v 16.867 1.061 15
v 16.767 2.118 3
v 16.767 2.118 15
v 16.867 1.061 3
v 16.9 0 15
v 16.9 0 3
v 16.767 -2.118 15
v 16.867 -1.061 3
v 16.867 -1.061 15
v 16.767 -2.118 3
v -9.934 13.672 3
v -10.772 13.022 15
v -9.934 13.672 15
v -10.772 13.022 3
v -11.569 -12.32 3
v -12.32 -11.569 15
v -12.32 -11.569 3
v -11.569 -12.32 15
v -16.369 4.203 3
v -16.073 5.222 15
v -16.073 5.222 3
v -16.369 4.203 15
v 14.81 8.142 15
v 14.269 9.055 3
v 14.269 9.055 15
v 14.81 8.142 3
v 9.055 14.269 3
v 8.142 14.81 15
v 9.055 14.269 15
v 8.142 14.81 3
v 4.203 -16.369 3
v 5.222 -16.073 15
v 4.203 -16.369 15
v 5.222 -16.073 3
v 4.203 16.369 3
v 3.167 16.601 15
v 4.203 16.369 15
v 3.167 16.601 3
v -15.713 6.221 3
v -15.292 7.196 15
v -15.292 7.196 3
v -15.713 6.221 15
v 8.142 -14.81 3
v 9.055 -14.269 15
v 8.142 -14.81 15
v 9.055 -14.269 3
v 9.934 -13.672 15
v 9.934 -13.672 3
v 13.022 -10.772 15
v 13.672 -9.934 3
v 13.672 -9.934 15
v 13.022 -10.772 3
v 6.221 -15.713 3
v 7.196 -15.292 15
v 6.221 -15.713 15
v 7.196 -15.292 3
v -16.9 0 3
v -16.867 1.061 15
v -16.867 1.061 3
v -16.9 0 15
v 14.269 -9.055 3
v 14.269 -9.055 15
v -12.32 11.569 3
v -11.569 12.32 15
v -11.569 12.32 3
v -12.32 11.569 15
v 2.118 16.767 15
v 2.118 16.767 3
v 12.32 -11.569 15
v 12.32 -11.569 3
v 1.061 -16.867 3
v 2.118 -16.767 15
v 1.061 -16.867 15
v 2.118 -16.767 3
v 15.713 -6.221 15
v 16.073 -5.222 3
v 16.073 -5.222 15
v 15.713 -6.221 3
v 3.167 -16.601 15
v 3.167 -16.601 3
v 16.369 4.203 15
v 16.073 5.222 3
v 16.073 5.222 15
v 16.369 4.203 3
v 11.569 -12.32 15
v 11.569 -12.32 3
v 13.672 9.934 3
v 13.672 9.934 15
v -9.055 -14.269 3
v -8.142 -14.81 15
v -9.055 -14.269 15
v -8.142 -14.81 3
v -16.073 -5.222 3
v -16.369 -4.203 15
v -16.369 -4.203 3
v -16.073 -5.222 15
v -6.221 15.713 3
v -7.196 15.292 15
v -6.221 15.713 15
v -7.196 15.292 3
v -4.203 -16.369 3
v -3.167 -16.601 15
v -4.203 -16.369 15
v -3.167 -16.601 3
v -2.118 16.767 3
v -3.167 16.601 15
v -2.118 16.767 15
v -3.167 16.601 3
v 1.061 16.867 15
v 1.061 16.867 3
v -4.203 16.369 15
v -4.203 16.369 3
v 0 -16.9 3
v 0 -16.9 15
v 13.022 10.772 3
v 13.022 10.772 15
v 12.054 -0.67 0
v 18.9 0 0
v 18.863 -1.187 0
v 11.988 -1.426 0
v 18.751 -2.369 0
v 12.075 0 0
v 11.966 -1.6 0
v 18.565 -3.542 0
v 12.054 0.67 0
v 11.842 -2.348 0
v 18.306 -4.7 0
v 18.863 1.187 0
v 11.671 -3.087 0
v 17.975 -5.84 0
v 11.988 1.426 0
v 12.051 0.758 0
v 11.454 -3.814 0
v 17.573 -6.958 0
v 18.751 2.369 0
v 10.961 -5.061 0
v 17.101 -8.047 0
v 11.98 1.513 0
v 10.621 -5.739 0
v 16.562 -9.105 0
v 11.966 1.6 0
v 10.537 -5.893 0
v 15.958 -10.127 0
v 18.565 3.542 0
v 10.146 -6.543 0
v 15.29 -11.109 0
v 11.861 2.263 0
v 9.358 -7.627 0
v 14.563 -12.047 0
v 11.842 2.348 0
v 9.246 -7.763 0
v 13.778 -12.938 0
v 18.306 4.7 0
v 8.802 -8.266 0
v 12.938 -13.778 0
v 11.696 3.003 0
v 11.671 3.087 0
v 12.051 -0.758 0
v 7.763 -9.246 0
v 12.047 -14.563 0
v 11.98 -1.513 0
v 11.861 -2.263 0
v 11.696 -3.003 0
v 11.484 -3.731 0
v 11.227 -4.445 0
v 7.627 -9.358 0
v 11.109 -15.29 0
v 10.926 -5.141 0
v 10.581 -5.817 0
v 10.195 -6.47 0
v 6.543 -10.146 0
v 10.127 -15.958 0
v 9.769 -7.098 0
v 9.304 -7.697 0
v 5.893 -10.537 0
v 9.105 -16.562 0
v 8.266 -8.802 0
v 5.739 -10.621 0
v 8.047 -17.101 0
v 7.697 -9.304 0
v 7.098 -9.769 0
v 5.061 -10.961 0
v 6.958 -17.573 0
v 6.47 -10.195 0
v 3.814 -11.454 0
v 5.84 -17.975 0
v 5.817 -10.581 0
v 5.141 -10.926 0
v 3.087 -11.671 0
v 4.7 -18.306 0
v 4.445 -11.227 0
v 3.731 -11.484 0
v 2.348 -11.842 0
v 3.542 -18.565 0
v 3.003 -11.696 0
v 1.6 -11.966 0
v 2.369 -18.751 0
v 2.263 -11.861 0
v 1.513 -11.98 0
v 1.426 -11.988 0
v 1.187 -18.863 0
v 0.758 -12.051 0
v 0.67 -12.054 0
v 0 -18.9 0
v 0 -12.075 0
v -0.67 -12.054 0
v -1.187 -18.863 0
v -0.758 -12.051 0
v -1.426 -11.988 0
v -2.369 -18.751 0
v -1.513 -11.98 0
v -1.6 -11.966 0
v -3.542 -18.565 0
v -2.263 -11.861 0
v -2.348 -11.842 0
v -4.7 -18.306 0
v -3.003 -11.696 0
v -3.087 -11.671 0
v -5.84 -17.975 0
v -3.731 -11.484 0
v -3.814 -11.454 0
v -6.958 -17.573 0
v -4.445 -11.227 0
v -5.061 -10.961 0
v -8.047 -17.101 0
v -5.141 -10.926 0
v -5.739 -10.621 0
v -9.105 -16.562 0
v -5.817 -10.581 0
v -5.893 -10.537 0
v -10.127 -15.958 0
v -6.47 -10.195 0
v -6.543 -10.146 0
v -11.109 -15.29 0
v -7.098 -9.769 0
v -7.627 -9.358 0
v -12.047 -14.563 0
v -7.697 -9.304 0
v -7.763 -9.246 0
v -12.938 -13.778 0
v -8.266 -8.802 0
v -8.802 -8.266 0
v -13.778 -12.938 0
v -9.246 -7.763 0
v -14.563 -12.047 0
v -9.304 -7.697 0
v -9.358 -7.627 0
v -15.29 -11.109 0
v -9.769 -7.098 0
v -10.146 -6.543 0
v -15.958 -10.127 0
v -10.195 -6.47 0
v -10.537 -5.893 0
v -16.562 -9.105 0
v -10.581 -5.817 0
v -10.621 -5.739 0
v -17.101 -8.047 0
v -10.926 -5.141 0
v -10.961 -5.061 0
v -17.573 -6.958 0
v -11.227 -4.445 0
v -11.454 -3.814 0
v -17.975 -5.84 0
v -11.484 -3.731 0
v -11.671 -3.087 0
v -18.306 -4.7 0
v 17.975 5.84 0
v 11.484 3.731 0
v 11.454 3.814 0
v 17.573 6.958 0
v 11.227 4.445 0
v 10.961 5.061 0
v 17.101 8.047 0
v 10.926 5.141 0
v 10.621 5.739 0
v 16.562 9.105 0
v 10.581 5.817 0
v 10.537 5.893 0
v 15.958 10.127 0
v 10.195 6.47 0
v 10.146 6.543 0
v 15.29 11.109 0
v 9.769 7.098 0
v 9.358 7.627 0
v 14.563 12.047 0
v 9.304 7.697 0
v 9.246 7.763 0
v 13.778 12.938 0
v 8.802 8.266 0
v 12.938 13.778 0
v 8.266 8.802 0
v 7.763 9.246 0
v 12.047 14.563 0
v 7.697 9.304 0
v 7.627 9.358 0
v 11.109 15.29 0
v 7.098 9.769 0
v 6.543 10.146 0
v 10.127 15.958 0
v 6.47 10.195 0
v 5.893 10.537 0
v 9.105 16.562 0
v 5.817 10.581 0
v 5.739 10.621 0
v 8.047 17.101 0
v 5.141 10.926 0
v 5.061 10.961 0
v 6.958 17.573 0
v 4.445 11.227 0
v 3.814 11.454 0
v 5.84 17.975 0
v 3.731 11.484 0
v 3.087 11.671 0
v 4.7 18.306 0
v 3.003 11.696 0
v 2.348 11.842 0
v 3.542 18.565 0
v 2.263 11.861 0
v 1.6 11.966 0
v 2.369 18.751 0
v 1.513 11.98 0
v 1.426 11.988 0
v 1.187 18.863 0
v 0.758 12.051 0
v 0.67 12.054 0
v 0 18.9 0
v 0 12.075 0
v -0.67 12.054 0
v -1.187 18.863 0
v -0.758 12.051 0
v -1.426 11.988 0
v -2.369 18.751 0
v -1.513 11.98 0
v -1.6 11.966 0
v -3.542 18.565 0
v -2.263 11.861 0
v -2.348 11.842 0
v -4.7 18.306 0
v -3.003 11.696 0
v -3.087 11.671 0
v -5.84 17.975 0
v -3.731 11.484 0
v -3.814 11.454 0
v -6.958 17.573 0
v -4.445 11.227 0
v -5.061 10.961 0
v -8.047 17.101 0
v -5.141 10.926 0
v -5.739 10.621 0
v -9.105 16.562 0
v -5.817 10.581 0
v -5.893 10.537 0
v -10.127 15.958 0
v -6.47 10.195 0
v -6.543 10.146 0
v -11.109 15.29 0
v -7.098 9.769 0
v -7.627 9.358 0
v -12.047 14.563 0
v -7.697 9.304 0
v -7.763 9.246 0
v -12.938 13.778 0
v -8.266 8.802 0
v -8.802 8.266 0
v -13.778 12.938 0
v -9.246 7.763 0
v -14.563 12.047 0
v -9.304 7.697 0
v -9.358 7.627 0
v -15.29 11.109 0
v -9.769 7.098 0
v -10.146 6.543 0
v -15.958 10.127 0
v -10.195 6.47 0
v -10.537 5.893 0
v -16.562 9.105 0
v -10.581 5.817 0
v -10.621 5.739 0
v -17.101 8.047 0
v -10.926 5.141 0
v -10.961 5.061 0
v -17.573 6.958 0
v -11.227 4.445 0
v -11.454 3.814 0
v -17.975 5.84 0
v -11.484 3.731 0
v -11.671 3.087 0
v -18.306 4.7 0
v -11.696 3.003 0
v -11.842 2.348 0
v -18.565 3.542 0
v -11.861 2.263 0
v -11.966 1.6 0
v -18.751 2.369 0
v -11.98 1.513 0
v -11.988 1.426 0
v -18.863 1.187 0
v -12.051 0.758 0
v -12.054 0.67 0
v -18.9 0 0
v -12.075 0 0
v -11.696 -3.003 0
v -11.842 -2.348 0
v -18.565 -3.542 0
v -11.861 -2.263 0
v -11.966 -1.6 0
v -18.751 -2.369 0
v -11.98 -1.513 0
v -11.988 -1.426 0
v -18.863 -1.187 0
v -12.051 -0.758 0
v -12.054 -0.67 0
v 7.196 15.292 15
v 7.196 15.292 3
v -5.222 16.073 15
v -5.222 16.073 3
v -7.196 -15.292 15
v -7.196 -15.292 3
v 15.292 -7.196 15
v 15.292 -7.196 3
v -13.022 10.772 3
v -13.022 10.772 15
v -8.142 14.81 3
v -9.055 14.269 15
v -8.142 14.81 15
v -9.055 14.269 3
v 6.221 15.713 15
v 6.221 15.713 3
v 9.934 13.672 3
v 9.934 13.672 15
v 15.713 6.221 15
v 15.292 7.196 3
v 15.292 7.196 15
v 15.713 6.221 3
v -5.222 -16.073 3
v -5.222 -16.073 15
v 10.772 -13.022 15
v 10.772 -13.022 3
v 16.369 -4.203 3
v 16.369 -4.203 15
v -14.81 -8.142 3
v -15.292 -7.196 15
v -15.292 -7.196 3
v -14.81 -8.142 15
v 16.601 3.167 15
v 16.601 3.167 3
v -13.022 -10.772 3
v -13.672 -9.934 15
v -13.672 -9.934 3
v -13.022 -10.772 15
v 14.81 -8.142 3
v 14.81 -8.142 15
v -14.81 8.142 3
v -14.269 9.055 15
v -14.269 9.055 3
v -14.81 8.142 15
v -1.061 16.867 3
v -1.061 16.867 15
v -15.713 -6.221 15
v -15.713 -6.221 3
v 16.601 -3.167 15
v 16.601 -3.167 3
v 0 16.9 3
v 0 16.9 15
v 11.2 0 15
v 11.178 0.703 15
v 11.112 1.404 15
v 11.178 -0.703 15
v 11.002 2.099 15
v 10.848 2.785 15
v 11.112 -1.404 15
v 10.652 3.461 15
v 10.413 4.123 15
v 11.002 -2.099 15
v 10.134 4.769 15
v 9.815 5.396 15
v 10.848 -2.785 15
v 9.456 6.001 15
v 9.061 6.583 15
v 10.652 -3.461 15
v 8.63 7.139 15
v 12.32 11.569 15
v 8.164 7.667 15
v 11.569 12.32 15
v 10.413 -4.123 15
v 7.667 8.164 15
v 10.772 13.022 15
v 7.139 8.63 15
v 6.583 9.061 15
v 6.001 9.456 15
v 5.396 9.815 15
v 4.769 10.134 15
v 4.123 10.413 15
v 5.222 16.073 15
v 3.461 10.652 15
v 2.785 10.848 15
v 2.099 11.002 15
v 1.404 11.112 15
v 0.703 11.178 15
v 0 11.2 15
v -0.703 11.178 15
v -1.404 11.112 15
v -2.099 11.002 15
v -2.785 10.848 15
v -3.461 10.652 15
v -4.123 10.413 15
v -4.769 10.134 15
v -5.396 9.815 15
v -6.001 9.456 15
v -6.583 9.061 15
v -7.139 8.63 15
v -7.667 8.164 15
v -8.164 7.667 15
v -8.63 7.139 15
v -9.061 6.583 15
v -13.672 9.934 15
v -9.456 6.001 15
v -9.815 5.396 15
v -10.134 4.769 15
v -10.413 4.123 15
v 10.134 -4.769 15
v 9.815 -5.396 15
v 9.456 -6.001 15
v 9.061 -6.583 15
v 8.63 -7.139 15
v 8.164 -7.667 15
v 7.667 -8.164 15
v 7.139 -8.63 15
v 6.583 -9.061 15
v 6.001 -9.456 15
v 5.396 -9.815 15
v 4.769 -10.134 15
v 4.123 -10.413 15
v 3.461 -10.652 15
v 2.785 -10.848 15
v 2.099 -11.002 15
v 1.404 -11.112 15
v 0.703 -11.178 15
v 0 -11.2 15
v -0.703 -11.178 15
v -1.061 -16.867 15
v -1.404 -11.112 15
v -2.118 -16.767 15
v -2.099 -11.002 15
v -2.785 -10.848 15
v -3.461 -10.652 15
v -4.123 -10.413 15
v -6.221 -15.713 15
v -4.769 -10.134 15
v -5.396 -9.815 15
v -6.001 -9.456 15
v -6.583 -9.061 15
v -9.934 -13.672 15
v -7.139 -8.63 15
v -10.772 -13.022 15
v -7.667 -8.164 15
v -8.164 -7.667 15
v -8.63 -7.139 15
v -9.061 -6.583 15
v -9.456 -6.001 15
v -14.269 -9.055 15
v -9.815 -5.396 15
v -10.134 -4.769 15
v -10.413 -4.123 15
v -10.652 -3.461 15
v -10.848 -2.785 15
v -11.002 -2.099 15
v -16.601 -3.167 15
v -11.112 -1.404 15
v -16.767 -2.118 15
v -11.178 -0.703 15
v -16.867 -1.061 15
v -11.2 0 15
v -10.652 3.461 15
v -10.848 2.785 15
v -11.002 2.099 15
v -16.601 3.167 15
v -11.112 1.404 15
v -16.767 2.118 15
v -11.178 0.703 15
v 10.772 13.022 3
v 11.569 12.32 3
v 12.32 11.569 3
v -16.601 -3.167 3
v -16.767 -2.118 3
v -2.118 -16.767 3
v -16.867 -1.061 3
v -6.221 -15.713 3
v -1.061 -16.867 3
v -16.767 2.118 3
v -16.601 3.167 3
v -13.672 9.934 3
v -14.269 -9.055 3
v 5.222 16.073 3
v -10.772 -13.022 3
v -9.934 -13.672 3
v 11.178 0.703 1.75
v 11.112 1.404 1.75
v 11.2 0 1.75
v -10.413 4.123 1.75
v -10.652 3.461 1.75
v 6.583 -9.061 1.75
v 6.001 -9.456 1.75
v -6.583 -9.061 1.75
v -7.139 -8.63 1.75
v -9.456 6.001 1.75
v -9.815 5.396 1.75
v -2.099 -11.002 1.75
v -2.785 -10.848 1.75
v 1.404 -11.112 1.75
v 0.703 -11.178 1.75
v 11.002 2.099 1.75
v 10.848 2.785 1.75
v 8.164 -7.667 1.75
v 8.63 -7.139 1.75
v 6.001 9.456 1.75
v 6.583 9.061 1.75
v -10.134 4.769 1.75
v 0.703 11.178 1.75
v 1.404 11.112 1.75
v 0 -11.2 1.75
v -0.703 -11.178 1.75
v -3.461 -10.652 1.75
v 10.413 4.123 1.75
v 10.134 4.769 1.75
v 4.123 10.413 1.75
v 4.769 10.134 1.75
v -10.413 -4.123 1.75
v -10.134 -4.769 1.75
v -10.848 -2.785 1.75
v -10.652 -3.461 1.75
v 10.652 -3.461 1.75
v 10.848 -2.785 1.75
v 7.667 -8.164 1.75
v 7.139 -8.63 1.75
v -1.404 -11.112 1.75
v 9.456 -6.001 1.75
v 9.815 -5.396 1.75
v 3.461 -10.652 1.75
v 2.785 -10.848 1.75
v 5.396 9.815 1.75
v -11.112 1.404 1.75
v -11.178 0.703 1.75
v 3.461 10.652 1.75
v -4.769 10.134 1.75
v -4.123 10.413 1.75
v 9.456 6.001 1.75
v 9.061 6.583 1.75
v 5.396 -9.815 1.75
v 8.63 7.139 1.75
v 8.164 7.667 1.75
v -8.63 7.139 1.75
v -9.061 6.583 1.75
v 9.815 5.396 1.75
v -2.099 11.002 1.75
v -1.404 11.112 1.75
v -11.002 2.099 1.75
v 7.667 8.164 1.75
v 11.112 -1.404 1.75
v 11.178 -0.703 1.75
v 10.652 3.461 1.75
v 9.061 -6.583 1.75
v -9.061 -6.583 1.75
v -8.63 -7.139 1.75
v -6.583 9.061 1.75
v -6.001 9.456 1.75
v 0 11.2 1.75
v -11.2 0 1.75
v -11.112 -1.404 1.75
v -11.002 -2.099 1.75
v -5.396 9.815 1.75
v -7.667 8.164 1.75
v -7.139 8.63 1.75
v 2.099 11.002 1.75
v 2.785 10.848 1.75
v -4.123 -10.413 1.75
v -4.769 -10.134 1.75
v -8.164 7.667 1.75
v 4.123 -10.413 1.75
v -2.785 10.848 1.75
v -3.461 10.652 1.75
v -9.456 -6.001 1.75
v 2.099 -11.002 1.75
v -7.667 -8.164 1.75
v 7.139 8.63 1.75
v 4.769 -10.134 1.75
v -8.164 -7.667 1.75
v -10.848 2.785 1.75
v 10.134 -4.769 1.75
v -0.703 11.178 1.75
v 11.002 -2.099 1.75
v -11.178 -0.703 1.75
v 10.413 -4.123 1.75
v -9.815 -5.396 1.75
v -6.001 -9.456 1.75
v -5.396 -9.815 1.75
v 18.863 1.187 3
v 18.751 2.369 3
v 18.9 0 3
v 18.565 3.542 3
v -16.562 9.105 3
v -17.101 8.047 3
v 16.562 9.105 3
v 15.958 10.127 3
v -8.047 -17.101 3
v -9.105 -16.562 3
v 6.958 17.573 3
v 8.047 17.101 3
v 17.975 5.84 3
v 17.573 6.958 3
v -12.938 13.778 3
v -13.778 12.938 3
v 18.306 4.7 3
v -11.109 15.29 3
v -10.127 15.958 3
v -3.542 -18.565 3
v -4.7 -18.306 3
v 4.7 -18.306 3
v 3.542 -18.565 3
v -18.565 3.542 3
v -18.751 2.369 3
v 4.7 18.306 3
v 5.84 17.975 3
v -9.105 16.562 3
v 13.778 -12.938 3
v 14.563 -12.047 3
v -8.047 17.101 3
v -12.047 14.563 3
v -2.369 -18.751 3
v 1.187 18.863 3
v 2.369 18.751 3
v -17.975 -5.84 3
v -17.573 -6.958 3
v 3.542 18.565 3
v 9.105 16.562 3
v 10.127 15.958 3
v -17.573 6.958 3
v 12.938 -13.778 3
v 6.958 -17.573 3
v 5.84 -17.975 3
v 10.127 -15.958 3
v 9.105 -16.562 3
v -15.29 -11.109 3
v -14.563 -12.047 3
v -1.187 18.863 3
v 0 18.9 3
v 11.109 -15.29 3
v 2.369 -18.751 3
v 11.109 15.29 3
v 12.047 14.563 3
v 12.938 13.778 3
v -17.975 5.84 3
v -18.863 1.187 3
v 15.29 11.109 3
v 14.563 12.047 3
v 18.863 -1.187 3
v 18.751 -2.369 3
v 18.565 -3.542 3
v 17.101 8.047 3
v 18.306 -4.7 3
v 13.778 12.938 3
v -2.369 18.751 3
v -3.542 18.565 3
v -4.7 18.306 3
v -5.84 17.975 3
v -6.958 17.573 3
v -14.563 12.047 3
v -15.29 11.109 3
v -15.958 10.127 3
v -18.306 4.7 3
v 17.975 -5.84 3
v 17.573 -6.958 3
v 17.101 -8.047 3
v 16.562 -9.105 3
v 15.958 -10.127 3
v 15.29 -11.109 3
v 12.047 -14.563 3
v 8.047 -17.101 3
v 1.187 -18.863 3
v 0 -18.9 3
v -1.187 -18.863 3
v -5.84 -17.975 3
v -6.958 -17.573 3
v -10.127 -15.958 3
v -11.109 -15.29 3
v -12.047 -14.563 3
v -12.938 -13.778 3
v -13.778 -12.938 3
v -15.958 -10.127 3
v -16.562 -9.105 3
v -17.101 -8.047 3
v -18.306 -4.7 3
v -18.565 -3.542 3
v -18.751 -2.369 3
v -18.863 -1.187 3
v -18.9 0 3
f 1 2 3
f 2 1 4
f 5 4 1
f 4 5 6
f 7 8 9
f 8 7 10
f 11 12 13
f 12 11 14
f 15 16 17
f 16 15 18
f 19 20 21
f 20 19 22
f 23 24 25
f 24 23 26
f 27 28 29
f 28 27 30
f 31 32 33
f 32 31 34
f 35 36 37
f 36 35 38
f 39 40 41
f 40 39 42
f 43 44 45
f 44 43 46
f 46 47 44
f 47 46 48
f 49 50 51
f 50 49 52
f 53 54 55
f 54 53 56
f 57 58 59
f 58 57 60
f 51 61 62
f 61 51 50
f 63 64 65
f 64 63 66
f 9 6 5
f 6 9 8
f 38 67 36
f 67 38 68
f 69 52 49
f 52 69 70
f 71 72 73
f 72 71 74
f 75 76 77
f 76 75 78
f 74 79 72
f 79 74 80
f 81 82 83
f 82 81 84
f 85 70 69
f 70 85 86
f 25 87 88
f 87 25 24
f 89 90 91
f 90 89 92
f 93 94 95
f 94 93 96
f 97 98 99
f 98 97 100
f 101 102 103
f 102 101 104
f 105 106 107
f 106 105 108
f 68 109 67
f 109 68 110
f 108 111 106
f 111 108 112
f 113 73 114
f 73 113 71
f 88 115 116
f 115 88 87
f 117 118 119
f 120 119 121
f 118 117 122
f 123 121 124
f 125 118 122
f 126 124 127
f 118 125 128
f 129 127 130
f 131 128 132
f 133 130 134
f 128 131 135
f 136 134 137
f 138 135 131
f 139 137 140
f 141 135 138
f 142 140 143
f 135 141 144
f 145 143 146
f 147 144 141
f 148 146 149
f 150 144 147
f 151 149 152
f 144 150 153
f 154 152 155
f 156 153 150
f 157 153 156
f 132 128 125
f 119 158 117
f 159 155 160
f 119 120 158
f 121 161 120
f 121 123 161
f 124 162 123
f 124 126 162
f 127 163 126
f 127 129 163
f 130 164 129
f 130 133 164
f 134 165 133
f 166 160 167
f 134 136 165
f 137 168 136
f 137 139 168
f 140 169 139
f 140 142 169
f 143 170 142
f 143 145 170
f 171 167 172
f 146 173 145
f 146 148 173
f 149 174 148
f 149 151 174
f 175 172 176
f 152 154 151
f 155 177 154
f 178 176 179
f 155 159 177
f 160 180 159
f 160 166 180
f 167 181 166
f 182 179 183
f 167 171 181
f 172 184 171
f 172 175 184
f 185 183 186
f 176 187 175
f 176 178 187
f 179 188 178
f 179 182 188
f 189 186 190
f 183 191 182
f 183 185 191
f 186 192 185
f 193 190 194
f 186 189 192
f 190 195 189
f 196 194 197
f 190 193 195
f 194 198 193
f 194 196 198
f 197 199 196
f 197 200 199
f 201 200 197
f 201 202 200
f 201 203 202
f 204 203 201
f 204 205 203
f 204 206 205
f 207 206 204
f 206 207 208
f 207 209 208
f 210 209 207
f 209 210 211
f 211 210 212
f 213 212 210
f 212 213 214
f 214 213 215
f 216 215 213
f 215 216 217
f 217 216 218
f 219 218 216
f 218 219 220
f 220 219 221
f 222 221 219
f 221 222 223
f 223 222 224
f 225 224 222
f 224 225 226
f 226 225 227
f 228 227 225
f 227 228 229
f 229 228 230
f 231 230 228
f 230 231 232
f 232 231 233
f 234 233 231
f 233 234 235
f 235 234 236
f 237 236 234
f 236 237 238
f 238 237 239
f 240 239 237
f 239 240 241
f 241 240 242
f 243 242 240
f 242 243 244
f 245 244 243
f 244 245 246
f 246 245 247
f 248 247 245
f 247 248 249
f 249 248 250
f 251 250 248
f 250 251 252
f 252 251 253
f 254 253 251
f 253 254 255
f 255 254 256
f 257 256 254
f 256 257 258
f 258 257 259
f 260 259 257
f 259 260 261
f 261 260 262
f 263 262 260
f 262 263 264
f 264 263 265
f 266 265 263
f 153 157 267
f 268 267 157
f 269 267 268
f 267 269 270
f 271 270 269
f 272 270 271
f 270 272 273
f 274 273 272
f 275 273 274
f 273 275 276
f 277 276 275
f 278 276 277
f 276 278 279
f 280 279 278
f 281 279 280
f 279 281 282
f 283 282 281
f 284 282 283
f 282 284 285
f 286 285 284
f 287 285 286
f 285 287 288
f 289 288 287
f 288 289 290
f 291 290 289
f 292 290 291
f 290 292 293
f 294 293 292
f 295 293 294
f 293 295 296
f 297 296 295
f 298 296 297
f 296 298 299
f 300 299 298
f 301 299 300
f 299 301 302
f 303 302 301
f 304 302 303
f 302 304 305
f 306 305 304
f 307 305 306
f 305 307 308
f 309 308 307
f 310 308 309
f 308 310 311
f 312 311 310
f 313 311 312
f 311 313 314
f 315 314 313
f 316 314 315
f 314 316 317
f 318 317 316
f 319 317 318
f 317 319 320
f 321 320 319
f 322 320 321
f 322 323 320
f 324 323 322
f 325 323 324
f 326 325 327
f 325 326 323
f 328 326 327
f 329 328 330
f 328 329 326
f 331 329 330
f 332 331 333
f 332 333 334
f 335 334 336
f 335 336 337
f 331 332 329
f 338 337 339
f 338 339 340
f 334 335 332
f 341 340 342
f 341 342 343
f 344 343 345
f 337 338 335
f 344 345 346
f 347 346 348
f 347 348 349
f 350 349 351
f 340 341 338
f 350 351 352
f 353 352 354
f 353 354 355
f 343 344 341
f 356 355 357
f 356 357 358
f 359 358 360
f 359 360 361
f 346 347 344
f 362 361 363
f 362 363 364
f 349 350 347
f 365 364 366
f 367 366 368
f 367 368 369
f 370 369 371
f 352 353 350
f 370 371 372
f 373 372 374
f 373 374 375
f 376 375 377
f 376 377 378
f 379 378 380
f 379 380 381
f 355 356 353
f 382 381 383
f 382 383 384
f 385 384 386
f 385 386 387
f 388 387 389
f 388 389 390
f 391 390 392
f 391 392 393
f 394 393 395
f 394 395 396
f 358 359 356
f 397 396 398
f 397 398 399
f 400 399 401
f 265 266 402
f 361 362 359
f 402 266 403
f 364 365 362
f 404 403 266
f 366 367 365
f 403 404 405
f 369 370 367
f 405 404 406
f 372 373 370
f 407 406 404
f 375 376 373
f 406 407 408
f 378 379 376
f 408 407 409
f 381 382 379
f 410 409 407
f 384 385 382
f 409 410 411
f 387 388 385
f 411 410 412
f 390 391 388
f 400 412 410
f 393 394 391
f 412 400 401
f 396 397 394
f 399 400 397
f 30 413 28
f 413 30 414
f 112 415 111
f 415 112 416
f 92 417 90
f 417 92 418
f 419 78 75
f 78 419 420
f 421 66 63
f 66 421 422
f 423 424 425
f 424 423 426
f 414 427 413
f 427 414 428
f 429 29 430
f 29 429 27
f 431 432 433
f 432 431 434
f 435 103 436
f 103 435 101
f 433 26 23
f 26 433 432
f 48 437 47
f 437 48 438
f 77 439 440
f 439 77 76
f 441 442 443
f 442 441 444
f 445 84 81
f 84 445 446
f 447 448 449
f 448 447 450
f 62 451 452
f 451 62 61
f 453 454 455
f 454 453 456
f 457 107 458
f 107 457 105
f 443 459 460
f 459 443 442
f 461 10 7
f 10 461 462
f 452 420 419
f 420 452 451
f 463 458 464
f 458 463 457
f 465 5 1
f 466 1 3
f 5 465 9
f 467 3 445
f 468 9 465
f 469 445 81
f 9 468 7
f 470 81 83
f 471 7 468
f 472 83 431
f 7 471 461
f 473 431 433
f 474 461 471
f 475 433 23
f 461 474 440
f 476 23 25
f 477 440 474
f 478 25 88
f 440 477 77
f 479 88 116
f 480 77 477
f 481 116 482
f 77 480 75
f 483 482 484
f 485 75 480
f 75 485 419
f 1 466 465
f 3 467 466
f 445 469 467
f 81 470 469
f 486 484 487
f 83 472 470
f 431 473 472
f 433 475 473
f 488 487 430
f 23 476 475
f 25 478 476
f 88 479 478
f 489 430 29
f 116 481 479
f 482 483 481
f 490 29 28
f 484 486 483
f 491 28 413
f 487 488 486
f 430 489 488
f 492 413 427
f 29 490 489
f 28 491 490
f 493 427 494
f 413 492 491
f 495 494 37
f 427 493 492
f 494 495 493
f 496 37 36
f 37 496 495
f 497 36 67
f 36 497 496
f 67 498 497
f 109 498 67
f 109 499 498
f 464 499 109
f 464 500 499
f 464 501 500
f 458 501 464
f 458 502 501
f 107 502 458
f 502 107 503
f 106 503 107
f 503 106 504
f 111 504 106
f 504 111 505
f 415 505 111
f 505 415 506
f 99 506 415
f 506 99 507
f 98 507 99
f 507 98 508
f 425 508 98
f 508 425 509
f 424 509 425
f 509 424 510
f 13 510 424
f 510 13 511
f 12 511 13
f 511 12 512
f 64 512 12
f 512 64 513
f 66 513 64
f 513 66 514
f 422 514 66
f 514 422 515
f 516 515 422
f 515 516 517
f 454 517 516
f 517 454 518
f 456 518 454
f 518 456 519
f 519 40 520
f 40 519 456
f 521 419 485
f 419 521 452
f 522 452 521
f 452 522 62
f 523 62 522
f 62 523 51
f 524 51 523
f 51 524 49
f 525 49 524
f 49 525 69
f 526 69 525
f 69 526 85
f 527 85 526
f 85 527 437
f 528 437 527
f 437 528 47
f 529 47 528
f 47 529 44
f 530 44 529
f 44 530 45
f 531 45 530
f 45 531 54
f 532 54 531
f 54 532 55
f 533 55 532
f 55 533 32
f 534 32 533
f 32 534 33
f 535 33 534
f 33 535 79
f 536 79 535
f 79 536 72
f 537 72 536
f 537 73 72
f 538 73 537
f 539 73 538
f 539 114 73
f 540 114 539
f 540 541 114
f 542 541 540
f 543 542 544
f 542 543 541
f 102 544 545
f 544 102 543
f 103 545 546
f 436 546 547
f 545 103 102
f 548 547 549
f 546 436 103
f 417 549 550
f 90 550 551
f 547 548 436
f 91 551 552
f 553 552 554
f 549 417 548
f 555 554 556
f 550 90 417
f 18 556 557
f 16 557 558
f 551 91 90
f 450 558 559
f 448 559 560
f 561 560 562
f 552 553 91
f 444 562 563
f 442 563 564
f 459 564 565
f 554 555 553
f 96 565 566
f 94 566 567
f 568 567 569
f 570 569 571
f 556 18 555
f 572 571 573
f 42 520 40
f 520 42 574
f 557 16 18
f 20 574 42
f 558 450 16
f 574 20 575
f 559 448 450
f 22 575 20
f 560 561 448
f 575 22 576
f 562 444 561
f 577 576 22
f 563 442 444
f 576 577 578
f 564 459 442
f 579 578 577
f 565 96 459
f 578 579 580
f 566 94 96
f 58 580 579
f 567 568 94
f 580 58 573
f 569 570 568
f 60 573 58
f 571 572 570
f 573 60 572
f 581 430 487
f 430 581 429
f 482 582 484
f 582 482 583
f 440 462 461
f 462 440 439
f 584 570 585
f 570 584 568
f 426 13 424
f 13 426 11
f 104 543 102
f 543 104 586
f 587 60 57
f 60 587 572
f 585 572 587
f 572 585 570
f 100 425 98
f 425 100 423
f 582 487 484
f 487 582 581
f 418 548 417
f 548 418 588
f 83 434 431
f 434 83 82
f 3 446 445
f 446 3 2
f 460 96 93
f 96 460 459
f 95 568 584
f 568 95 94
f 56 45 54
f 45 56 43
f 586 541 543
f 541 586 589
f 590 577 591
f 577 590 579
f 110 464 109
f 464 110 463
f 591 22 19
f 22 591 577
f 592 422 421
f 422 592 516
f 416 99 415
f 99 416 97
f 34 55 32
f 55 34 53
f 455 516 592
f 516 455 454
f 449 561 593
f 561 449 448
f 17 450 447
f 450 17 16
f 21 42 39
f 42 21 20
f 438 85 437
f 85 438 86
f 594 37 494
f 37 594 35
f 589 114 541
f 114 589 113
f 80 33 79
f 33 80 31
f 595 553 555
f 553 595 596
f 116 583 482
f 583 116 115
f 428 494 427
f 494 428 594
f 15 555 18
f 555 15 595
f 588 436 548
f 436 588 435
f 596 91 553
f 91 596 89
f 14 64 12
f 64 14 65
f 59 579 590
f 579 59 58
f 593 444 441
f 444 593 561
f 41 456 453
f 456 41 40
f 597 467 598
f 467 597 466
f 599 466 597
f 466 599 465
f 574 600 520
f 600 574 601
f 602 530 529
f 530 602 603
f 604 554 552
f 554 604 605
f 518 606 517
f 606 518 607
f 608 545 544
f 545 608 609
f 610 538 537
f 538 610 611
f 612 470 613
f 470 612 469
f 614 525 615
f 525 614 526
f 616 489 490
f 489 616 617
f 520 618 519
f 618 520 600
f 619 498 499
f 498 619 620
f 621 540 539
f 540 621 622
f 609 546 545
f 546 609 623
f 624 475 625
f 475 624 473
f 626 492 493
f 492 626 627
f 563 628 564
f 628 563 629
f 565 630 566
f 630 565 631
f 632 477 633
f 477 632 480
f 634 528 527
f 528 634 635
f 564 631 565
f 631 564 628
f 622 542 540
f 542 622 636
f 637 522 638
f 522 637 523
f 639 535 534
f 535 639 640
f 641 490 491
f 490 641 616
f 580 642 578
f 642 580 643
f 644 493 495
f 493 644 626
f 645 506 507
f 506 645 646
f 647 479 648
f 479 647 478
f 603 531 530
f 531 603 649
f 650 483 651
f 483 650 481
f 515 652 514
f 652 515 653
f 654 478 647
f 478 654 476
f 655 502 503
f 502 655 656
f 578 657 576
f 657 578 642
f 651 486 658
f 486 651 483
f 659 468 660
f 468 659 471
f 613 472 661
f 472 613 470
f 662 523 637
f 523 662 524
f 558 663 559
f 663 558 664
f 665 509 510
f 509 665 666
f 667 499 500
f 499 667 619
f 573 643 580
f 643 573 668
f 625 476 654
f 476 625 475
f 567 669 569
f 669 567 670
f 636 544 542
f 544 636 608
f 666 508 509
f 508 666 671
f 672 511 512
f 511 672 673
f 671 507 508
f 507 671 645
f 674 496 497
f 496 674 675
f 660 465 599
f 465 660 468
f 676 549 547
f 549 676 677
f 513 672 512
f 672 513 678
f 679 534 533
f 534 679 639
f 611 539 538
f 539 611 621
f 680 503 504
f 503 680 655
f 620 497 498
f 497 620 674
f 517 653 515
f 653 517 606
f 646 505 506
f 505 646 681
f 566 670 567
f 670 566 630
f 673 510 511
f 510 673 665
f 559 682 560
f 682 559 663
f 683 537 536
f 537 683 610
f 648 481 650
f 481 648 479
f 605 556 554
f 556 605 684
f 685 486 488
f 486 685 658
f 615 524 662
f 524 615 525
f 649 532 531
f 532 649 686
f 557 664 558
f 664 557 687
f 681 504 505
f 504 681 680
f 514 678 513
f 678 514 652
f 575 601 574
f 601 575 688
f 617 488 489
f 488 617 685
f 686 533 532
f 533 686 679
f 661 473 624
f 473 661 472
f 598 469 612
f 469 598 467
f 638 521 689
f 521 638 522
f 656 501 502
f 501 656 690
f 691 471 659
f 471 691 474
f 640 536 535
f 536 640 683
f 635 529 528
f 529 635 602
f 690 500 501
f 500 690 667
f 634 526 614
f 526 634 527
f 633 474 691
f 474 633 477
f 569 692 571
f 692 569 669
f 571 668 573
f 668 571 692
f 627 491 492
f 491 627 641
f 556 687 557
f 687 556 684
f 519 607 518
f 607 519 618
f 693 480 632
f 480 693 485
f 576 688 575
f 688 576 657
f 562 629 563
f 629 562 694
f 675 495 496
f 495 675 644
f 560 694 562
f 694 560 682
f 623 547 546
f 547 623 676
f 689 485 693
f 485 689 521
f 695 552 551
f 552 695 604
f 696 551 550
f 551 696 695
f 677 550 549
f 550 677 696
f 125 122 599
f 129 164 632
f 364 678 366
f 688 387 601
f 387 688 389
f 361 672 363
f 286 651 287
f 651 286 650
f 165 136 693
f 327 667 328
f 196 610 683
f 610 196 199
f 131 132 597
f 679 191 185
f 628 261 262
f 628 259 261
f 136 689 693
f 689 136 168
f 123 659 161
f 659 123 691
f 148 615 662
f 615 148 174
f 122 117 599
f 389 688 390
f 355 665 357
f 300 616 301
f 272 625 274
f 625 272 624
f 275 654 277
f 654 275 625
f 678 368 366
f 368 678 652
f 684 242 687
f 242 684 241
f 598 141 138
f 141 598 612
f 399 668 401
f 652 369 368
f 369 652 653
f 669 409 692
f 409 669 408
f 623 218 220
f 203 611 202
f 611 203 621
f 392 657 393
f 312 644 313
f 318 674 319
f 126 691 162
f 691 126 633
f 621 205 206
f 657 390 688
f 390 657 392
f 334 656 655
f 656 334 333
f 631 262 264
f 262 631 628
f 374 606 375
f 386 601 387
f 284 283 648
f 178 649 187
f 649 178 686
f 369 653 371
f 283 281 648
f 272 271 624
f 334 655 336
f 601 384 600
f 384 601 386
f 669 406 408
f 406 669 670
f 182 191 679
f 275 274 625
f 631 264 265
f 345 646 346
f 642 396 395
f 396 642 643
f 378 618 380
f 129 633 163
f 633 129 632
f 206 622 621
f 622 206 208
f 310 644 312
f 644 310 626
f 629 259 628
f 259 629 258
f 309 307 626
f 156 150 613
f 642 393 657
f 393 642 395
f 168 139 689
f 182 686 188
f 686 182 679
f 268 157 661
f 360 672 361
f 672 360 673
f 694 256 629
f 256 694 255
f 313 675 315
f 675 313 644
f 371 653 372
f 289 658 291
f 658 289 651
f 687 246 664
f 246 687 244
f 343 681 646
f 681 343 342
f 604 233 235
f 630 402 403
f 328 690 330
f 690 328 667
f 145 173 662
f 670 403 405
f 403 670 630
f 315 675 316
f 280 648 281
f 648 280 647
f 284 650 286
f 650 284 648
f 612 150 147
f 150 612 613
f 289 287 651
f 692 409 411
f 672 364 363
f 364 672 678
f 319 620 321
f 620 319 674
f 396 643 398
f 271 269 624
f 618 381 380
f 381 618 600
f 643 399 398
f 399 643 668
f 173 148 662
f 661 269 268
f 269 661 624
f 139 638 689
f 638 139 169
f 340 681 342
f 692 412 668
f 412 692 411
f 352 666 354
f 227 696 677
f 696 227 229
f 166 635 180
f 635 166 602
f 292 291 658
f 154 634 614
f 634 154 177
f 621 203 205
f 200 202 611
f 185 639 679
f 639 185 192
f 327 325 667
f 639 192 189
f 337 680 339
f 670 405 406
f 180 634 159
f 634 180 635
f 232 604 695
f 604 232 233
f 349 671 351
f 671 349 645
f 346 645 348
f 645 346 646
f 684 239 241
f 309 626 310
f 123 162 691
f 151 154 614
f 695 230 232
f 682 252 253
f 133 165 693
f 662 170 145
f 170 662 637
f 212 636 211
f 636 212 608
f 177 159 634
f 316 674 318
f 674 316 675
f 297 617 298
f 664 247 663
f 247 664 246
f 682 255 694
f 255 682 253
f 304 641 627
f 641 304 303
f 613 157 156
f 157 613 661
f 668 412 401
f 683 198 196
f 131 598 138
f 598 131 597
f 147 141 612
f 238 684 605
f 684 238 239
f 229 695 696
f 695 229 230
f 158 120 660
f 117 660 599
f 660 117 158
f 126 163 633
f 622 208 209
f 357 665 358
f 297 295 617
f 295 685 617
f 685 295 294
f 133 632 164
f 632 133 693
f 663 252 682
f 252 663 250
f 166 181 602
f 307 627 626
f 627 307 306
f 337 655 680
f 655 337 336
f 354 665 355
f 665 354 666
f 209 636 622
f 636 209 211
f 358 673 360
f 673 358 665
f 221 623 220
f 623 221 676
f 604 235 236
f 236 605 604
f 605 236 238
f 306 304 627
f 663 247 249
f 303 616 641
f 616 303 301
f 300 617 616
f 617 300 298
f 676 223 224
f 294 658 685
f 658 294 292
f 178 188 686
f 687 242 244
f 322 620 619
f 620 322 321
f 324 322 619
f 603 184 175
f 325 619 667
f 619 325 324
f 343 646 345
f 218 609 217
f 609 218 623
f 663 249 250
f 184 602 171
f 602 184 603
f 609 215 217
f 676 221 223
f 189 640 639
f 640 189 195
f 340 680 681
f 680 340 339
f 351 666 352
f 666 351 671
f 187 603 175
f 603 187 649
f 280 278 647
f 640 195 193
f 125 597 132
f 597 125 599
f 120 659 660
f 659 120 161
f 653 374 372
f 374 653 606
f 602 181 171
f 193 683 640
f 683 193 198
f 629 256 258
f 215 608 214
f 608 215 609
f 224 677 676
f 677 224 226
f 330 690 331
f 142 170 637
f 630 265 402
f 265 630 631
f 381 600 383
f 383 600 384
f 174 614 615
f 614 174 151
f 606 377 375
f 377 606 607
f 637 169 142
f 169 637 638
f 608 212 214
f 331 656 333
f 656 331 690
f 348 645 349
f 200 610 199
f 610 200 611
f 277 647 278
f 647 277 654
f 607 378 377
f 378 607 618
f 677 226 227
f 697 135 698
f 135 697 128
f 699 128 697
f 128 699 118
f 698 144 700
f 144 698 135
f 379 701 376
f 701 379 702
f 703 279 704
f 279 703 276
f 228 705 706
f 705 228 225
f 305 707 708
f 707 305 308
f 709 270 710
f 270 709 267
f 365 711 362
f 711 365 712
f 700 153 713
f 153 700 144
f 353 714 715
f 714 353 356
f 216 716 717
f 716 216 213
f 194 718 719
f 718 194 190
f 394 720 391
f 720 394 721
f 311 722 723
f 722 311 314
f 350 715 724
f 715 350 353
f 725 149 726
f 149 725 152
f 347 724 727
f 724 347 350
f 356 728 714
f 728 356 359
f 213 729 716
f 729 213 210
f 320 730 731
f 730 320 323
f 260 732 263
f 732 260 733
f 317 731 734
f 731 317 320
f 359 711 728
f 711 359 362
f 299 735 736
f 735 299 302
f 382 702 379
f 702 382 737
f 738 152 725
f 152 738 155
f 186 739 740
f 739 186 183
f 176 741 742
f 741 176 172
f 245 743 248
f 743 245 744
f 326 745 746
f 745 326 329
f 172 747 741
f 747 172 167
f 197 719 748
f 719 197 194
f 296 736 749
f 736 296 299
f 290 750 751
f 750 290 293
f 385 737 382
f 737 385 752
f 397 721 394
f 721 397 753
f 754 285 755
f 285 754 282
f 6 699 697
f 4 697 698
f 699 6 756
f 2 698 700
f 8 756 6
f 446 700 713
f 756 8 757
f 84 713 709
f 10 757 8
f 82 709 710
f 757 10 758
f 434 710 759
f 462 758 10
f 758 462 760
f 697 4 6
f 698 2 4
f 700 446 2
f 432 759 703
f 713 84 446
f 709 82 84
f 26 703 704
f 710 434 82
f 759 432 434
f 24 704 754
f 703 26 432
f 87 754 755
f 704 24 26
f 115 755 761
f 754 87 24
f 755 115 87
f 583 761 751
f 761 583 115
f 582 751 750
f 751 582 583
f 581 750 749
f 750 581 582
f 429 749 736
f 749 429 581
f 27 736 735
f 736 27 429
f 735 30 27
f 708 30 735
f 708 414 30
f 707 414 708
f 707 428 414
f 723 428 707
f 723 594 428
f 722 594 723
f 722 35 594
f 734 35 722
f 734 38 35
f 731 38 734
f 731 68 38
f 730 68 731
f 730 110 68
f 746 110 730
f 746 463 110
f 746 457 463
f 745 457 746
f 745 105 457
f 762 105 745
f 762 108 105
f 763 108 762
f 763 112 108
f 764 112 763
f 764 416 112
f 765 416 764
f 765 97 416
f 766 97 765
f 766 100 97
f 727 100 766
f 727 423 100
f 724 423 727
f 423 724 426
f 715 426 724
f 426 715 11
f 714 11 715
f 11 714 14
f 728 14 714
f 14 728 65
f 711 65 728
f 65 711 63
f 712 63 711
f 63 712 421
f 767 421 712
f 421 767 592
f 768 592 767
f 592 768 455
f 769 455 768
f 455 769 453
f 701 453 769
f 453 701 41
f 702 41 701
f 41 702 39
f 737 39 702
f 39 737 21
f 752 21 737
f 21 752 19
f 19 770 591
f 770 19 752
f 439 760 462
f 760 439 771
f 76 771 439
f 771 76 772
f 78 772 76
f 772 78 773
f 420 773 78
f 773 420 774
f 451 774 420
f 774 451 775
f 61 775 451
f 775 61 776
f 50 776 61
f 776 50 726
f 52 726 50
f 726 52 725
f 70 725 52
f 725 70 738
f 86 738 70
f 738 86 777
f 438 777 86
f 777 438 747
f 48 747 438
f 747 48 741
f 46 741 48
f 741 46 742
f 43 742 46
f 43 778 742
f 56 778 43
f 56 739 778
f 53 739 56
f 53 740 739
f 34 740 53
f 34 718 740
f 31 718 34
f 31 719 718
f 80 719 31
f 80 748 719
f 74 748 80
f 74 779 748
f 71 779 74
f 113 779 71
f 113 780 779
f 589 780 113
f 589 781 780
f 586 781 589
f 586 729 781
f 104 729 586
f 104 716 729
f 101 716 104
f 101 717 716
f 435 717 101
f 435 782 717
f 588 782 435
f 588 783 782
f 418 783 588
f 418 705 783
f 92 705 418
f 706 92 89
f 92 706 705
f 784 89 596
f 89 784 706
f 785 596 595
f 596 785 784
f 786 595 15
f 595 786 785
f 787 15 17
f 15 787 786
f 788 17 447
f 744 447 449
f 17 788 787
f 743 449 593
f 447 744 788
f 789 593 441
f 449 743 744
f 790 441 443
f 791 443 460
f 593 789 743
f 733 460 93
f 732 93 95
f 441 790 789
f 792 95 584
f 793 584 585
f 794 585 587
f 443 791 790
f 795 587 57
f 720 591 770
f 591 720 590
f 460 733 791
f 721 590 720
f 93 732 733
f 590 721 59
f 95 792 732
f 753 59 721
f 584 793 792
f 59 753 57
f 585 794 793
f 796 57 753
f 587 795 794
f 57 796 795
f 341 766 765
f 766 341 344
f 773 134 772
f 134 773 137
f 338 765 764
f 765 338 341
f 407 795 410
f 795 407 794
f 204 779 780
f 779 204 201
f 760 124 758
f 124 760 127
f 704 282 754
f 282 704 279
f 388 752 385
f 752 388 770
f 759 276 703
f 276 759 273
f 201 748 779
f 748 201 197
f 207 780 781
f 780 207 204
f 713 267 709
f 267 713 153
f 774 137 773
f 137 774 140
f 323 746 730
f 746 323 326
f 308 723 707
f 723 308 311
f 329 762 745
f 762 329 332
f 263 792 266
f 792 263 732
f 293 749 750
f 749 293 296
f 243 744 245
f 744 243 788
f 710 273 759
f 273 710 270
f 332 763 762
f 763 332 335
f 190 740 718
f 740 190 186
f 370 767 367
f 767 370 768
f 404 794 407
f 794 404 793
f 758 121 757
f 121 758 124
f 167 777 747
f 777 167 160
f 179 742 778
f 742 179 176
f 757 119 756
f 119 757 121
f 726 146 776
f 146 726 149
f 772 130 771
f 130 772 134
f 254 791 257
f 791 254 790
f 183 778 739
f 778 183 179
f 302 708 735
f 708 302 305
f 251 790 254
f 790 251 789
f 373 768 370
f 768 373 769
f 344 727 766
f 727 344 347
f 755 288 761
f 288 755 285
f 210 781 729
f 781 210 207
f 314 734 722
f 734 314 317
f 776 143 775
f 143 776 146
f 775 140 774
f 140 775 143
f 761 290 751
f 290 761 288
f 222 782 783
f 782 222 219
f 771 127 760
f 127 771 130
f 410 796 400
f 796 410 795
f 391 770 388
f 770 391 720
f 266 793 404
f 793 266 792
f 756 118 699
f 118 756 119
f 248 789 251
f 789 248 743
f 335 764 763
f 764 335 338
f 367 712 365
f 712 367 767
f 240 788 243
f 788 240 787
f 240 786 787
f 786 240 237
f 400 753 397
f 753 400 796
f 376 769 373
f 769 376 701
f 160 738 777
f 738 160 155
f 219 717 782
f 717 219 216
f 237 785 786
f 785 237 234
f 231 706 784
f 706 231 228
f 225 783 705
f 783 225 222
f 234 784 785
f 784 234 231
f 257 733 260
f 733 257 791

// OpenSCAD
//fitting to pipe adapter


$fn=100;

LPR=16.90;  //enter larger pvc pipe radii here (for standard 1" PVC, LPR=16.90, for 32mm PR=16.2)
SPR=11.2;   //enter smaller pvc pipe radii here (for standard 3/4" CPVC, SPR=11.2)

difference () {
    cylinder(15,LPR,LPR);
    translate([0,0,-1]) cylinder(25,SPR,SPR);
    translate ([0,0,-0.25])cylinder (2,SPR+1,SPR);
    }

difference () {
    cylinder(3,LPR+2,LPR+2);
    translate([0,0,-1])cylinder(25,SPR,SPR);
    translate ([0,0,-0.25])cylinder (2,SPR+1,SPR);
    }
